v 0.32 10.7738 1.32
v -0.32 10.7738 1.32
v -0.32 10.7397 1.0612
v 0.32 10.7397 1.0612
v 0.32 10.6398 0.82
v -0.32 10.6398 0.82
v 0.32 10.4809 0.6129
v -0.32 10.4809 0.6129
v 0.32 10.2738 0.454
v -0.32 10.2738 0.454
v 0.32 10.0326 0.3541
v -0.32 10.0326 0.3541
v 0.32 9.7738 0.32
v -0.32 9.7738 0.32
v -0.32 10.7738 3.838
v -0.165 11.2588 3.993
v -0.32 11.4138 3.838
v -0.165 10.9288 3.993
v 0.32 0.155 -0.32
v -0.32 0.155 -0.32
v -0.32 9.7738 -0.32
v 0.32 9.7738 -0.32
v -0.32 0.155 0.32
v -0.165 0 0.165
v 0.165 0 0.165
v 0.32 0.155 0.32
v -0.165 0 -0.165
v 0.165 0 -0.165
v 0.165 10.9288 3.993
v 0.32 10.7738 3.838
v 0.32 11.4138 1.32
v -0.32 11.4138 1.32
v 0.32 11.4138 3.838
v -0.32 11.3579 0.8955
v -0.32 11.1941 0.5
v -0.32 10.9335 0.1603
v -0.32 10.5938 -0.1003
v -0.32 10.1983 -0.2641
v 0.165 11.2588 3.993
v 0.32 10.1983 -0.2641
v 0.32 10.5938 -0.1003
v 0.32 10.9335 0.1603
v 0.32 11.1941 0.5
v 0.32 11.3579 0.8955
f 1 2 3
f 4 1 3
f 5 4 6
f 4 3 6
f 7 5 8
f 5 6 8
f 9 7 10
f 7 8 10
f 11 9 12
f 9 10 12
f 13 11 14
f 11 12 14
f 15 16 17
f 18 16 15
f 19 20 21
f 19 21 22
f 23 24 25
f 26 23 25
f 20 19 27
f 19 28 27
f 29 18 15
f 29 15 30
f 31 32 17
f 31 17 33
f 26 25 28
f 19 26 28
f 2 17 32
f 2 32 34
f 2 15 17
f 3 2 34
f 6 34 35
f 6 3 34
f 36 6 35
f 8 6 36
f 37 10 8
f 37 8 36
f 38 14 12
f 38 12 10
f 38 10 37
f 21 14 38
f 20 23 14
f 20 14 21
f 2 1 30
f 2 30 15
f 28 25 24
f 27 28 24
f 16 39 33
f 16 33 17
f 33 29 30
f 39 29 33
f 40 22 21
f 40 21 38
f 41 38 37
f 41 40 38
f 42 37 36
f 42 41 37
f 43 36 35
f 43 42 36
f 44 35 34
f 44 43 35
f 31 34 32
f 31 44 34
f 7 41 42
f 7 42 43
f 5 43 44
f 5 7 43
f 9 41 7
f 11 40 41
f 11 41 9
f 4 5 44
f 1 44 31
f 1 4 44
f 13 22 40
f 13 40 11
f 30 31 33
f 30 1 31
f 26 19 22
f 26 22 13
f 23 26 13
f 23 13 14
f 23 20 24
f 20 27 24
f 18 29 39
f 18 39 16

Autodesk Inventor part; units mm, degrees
ref_plane "YZ Plane" through (0, 0, 0) normal (1, 0, 0) x (0, 1, 0)
ref_plane "XZ Plane" through (0, 0, 0) normal (0, 1, 0) x (-1, 0, 0)
ref_plane "XY Plane" through (0, 0, 0) normal (0, 0, 1) x (1, 0, 0)
sketch "Sketch1" plane through (0, 0, 0) normal (0, 1, 0) x (-1, 0, 0)
  line L0 (0.32, -0.32) -> (-0.32, -0.32)
  line L1 (-0.32, -0.32) -> (-0.32, 0.32)
  line L2 (-0.32, 0.32) -> (0.32, 0.32)
  line L3 (0.32, 0.32) -> (0.32, -0.32)
  line L4 (0.32, -0.32) -> (-0.32, 0.32) construction
  line L5 (-0.32, -0.32) -> (0.32, 0.32) construction
  point P0 (0, 0)
  dimension "d0" = 0.64
  dimension "d1" = 0.64
extrude "Extrusion1" add sketch "Sketch1" along normal blind 14.0176
chamfer "Chamfer1" distance 0.155 angle 45 8 edges at (0.32, 14.0176, 0) (0, 14.0176, -0.32) (0, 14.0176, 0.32) (-0.32, 14.0176, 0) (0.32, 0, 0) (0, 0, -0.32) (0, 0, 0.32) (-0.32, 0, 0)
sketch "Sketch2" plane through (-0.32, 0.155, 0.32) normal (0, 0, 1) x (1, 0, 0)
  line L0 (-0.9237, 9.6188) -> (1.8536, 9.6188)
  point P0 (0.32, -0.155)
  dimension "d7" = 9.7738
bend part "Bend Part1" radius 1 angle 90 line through (-1.2437, 9.7738, 0.32) along (1, 0, 0) centre toward (0, 0, 1) moving side (0, 1, 0) both sides no
properties part number "PinRight2" material "Gold"
